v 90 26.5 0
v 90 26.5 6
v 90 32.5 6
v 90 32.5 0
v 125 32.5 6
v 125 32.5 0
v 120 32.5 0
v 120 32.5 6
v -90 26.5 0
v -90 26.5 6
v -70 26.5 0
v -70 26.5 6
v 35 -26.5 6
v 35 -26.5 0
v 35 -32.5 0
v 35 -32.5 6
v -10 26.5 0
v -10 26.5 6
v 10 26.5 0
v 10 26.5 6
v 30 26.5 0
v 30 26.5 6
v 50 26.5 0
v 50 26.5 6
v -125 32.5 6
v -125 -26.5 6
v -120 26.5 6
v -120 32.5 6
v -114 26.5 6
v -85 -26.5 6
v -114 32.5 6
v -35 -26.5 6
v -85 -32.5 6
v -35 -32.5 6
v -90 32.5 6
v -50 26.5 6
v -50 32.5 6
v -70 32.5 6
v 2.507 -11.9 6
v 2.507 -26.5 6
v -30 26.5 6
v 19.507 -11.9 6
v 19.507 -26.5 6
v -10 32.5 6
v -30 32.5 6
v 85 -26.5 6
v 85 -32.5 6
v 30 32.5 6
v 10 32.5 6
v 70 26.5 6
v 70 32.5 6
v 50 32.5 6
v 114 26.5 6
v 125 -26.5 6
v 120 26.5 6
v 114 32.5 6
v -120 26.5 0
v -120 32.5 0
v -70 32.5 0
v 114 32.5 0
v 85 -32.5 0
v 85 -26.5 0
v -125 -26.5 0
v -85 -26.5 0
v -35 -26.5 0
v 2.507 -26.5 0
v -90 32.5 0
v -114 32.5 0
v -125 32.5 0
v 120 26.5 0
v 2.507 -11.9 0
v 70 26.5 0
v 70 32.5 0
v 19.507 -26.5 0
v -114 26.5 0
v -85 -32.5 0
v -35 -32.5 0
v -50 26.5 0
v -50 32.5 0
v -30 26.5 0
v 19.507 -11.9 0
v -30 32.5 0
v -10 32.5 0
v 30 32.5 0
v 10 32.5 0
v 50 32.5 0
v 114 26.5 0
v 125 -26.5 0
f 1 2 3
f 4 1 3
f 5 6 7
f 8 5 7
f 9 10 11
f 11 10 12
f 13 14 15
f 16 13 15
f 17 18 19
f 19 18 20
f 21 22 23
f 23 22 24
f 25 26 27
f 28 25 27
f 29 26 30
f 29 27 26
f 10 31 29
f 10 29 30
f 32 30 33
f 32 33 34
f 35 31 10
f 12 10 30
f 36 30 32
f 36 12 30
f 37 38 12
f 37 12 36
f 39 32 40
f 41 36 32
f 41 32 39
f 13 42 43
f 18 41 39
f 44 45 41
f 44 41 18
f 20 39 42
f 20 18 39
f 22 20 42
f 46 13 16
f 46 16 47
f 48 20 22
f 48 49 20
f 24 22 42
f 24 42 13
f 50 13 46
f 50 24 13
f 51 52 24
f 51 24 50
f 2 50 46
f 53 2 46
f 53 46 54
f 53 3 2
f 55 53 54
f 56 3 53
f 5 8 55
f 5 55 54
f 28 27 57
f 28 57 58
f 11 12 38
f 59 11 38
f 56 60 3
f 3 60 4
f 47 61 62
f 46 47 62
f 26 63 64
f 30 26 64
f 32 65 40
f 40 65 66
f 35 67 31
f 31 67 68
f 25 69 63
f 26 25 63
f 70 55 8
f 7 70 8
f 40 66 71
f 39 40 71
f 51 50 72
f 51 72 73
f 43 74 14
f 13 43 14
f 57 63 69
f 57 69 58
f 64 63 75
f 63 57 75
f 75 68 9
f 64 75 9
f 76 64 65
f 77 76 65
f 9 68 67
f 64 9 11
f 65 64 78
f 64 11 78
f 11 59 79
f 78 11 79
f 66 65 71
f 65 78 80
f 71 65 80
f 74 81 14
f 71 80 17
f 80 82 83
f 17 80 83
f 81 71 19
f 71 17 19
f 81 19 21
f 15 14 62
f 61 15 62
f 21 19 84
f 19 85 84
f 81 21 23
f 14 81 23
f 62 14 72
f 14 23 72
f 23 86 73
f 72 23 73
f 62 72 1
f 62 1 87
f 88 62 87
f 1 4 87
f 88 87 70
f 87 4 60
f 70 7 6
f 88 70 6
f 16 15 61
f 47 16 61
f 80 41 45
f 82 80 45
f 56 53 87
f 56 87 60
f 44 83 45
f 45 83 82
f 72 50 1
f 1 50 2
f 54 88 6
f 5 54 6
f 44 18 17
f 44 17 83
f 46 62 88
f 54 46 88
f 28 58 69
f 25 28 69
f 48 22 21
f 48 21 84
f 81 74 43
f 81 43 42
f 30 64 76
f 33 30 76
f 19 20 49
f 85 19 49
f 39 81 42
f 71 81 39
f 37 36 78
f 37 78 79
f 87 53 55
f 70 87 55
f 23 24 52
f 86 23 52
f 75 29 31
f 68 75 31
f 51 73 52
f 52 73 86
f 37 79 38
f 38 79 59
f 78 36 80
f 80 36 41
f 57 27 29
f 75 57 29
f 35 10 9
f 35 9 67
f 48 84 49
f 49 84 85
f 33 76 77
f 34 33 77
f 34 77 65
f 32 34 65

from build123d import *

# Parameters (mm, degrees)
BOSS_EXTRUDE1_DEPTH = 6
CUT_EXTRUDE1_REACH  = 8
SKETCH2_W           = 20
SKETCH2_H           = 6
SKETCH2_W_2         = 6
CUT_EXTRUDE2_REACH  = 8
SKETCH3_W           = 17
SKETCH3_H           = 15.5


with BuildPart() as part:
    # Sketch1 → Boss-Extrude1 (new body)
    with BuildSketch(Plane.XY):
        Polygon((-85, -26.5), (-85, -32.5), (-35, -32.5), (-35, -26.5), (35, -26.5), (35, -32.5), (85, -32.5), (85, -26.5), (125, -26.5), (125, 32.5), (-125, 32.5), (-125, -26.5), align=None)
    extrude(amount=BOSS_EXTRUDE1_DEPTH)

    # Sketch2 → Cut-Extrude1 (cut, up to next)
    with BuildSketch(Plane.XY.offset(6), mode=Mode.PRIVATE) as cut_extrude1_sk1:
        with Locations((-80, 29.5)):
            Rectangle(SKETCH2_W, SKETCH2_H)
    cut_extrude1_tool1 = extrude(cut_extrude1_sk1.sketch, amount=-CUT_EXTRUDE1_REACH, mode=Mode.PRIVATE) & part.part
    add(cut_extrude1_tool1.solids().sort_by_distance((-80, 29.5, 6))[0], mode=Mode.SUBTRACT)
    # Sketch2 → Cut-Extrude1 (cut, up to next)
    with BuildSketch(Plane.XY.offset(6), mode=Mode.PRIVATE) as cut_extrude1_sk2:
        with Locations((-40, 29.5)):
            Rectangle(SKETCH2_W, SKETCH2_H)
    cut_extrude1_tool2 = extrude(cut_extrude1_sk2.sketch, amount=-CUT_EXTRUDE1_REACH, mode=Mode.PRIVATE) & part.part
    add(cut_extrude1_tool2.solids().sort_by_distance((-40, 29.5, 6))[0], mode=Mode.SUBTRACT)
    # Sketch2 → Cut-Extrude1 (cut, up to next)
    with BuildSketch(Plane.XY.offset(6), mode=Mode.PRIVATE) as cut_extrude1_sk3:
        with Locations((0, 29.5)):
            Rectangle(SKETCH2_W, SKETCH2_H)
    cut_extrude1_tool3 = extrude(cut_extrude1_sk3.sketch, amount=-CUT_EXTRUDE1_REACH, mode=Mode.PRIVATE) & part.part
    add(cut_extrude1_tool3.solids().sort_by_distance((0, 29.5, 6))[0], mode=Mode.SUBTRACT)
    # Sketch2 → Cut-Extrude1 (cut, up to next)
    with BuildSketch(Plane.XY.offset(6), mode=Mode.PRIVATE) as cut_extrude1_sk4:
        with Locations((40, 29.5)):
            Rectangle(SKETCH2_W, SKETCH2_H)
    cut_extrude1_tool4 = extrude(cut_extrude1_sk4.sketch, amount=-CUT_EXTRUDE1_REACH, mode=Mode.PRIVATE) & part.part
    add(cut_extrude1_tool4.solids().sort_by_distance((40, 29.5, 6))[0], mode=Mode.SUBTRACT)
    # Sketch2 → Cut-Extrude1 (cut, up to next)
    with BuildSketch(Plane.XY.offset(6), mode=Mode.PRIVATE) as cut_extrude1_sk5:
        with Locations((80, 29.5)):
            Rectangle(SKETCH2_W, SKETCH2_H)
    cut_extrude1_tool5 = extrude(cut_extrude1_sk5.sketch, amount=-CUT_EXTRUDE1_REACH, mode=Mode.PRIVATE) & part.part
    add(cut_extrude1_tool5.solids().sort_by_distance((80, 29.5, 6))[0], mode=Mode.SUBTRACT)
    # Sketch2 → Cut-Extrude1 (cut, up to next)
    with BuildSketch(Plane.XY.offset(6), mode=Mode.PRIVATE) as cut_extrude1_sk6:
        with Locations((-117, 29.5)):
            Rectangle(SKETCH2_W_2, SKETCH2_H)
    cut_extrude1_tool6 = extrude(cut_extrude1_sk6.sketch, amount=-CUT_EXTRUDE1_REACH, mode=Mode.PRIVATE) & part.part
    add(cut_extrude1_tool6.solids().sort_by_distance((-117, 29.5, 6))[0], mode=Mode.SUBTRACT)
    # Sketch2 → Cut-Extrude1 (cut, up to next)
    with BuildSketch(Plane.XY.offset(6), mode=Mode.PRIVATE) as cut_extrude1_sk7:
        with Locations((117, 29.5)):
            Rectangle(SKETCH2_W_2, SKETCH2_H)
    cut_extrude1_tool7 = extrude(cut_extrude1_sk7.sketch, amount=-CUT_EXTRUDE1_REACH, mode=Mode.PRIVATE) & part.part
    add(cut_extrude1_tool7.solids().sort_by_distance((117, 29.5, 6))[0], mode=Mode.SUBTRACT)

    # Sketch3 → Cut-Extrude2 (cut, up to next)
    with BuildSketch(Plane(origin=(0, 0, 0), x_dir=(-1, 0, 0), z_dir=(0, 0, -1)), mode=Mode.PRIVATE) as cut_extrude2_sk1:
        with Locations((-11.006971283, -19.65)):
            Rectangle(SKETCH3_W, SKETCH3_H)
    cut_extrude2_tool1 = extrude(cut_extrude2_sk1.sketch, amount=-CUT_EXTRUDE2_REACH, mode=Mode.PRIVATE) & part.part
    add(cut_extrude2_tool1.solids().sort_by_distance((11.006971, -19.65, 0))[0], mode=Mode.SUBTRACT)


solid = part.part
